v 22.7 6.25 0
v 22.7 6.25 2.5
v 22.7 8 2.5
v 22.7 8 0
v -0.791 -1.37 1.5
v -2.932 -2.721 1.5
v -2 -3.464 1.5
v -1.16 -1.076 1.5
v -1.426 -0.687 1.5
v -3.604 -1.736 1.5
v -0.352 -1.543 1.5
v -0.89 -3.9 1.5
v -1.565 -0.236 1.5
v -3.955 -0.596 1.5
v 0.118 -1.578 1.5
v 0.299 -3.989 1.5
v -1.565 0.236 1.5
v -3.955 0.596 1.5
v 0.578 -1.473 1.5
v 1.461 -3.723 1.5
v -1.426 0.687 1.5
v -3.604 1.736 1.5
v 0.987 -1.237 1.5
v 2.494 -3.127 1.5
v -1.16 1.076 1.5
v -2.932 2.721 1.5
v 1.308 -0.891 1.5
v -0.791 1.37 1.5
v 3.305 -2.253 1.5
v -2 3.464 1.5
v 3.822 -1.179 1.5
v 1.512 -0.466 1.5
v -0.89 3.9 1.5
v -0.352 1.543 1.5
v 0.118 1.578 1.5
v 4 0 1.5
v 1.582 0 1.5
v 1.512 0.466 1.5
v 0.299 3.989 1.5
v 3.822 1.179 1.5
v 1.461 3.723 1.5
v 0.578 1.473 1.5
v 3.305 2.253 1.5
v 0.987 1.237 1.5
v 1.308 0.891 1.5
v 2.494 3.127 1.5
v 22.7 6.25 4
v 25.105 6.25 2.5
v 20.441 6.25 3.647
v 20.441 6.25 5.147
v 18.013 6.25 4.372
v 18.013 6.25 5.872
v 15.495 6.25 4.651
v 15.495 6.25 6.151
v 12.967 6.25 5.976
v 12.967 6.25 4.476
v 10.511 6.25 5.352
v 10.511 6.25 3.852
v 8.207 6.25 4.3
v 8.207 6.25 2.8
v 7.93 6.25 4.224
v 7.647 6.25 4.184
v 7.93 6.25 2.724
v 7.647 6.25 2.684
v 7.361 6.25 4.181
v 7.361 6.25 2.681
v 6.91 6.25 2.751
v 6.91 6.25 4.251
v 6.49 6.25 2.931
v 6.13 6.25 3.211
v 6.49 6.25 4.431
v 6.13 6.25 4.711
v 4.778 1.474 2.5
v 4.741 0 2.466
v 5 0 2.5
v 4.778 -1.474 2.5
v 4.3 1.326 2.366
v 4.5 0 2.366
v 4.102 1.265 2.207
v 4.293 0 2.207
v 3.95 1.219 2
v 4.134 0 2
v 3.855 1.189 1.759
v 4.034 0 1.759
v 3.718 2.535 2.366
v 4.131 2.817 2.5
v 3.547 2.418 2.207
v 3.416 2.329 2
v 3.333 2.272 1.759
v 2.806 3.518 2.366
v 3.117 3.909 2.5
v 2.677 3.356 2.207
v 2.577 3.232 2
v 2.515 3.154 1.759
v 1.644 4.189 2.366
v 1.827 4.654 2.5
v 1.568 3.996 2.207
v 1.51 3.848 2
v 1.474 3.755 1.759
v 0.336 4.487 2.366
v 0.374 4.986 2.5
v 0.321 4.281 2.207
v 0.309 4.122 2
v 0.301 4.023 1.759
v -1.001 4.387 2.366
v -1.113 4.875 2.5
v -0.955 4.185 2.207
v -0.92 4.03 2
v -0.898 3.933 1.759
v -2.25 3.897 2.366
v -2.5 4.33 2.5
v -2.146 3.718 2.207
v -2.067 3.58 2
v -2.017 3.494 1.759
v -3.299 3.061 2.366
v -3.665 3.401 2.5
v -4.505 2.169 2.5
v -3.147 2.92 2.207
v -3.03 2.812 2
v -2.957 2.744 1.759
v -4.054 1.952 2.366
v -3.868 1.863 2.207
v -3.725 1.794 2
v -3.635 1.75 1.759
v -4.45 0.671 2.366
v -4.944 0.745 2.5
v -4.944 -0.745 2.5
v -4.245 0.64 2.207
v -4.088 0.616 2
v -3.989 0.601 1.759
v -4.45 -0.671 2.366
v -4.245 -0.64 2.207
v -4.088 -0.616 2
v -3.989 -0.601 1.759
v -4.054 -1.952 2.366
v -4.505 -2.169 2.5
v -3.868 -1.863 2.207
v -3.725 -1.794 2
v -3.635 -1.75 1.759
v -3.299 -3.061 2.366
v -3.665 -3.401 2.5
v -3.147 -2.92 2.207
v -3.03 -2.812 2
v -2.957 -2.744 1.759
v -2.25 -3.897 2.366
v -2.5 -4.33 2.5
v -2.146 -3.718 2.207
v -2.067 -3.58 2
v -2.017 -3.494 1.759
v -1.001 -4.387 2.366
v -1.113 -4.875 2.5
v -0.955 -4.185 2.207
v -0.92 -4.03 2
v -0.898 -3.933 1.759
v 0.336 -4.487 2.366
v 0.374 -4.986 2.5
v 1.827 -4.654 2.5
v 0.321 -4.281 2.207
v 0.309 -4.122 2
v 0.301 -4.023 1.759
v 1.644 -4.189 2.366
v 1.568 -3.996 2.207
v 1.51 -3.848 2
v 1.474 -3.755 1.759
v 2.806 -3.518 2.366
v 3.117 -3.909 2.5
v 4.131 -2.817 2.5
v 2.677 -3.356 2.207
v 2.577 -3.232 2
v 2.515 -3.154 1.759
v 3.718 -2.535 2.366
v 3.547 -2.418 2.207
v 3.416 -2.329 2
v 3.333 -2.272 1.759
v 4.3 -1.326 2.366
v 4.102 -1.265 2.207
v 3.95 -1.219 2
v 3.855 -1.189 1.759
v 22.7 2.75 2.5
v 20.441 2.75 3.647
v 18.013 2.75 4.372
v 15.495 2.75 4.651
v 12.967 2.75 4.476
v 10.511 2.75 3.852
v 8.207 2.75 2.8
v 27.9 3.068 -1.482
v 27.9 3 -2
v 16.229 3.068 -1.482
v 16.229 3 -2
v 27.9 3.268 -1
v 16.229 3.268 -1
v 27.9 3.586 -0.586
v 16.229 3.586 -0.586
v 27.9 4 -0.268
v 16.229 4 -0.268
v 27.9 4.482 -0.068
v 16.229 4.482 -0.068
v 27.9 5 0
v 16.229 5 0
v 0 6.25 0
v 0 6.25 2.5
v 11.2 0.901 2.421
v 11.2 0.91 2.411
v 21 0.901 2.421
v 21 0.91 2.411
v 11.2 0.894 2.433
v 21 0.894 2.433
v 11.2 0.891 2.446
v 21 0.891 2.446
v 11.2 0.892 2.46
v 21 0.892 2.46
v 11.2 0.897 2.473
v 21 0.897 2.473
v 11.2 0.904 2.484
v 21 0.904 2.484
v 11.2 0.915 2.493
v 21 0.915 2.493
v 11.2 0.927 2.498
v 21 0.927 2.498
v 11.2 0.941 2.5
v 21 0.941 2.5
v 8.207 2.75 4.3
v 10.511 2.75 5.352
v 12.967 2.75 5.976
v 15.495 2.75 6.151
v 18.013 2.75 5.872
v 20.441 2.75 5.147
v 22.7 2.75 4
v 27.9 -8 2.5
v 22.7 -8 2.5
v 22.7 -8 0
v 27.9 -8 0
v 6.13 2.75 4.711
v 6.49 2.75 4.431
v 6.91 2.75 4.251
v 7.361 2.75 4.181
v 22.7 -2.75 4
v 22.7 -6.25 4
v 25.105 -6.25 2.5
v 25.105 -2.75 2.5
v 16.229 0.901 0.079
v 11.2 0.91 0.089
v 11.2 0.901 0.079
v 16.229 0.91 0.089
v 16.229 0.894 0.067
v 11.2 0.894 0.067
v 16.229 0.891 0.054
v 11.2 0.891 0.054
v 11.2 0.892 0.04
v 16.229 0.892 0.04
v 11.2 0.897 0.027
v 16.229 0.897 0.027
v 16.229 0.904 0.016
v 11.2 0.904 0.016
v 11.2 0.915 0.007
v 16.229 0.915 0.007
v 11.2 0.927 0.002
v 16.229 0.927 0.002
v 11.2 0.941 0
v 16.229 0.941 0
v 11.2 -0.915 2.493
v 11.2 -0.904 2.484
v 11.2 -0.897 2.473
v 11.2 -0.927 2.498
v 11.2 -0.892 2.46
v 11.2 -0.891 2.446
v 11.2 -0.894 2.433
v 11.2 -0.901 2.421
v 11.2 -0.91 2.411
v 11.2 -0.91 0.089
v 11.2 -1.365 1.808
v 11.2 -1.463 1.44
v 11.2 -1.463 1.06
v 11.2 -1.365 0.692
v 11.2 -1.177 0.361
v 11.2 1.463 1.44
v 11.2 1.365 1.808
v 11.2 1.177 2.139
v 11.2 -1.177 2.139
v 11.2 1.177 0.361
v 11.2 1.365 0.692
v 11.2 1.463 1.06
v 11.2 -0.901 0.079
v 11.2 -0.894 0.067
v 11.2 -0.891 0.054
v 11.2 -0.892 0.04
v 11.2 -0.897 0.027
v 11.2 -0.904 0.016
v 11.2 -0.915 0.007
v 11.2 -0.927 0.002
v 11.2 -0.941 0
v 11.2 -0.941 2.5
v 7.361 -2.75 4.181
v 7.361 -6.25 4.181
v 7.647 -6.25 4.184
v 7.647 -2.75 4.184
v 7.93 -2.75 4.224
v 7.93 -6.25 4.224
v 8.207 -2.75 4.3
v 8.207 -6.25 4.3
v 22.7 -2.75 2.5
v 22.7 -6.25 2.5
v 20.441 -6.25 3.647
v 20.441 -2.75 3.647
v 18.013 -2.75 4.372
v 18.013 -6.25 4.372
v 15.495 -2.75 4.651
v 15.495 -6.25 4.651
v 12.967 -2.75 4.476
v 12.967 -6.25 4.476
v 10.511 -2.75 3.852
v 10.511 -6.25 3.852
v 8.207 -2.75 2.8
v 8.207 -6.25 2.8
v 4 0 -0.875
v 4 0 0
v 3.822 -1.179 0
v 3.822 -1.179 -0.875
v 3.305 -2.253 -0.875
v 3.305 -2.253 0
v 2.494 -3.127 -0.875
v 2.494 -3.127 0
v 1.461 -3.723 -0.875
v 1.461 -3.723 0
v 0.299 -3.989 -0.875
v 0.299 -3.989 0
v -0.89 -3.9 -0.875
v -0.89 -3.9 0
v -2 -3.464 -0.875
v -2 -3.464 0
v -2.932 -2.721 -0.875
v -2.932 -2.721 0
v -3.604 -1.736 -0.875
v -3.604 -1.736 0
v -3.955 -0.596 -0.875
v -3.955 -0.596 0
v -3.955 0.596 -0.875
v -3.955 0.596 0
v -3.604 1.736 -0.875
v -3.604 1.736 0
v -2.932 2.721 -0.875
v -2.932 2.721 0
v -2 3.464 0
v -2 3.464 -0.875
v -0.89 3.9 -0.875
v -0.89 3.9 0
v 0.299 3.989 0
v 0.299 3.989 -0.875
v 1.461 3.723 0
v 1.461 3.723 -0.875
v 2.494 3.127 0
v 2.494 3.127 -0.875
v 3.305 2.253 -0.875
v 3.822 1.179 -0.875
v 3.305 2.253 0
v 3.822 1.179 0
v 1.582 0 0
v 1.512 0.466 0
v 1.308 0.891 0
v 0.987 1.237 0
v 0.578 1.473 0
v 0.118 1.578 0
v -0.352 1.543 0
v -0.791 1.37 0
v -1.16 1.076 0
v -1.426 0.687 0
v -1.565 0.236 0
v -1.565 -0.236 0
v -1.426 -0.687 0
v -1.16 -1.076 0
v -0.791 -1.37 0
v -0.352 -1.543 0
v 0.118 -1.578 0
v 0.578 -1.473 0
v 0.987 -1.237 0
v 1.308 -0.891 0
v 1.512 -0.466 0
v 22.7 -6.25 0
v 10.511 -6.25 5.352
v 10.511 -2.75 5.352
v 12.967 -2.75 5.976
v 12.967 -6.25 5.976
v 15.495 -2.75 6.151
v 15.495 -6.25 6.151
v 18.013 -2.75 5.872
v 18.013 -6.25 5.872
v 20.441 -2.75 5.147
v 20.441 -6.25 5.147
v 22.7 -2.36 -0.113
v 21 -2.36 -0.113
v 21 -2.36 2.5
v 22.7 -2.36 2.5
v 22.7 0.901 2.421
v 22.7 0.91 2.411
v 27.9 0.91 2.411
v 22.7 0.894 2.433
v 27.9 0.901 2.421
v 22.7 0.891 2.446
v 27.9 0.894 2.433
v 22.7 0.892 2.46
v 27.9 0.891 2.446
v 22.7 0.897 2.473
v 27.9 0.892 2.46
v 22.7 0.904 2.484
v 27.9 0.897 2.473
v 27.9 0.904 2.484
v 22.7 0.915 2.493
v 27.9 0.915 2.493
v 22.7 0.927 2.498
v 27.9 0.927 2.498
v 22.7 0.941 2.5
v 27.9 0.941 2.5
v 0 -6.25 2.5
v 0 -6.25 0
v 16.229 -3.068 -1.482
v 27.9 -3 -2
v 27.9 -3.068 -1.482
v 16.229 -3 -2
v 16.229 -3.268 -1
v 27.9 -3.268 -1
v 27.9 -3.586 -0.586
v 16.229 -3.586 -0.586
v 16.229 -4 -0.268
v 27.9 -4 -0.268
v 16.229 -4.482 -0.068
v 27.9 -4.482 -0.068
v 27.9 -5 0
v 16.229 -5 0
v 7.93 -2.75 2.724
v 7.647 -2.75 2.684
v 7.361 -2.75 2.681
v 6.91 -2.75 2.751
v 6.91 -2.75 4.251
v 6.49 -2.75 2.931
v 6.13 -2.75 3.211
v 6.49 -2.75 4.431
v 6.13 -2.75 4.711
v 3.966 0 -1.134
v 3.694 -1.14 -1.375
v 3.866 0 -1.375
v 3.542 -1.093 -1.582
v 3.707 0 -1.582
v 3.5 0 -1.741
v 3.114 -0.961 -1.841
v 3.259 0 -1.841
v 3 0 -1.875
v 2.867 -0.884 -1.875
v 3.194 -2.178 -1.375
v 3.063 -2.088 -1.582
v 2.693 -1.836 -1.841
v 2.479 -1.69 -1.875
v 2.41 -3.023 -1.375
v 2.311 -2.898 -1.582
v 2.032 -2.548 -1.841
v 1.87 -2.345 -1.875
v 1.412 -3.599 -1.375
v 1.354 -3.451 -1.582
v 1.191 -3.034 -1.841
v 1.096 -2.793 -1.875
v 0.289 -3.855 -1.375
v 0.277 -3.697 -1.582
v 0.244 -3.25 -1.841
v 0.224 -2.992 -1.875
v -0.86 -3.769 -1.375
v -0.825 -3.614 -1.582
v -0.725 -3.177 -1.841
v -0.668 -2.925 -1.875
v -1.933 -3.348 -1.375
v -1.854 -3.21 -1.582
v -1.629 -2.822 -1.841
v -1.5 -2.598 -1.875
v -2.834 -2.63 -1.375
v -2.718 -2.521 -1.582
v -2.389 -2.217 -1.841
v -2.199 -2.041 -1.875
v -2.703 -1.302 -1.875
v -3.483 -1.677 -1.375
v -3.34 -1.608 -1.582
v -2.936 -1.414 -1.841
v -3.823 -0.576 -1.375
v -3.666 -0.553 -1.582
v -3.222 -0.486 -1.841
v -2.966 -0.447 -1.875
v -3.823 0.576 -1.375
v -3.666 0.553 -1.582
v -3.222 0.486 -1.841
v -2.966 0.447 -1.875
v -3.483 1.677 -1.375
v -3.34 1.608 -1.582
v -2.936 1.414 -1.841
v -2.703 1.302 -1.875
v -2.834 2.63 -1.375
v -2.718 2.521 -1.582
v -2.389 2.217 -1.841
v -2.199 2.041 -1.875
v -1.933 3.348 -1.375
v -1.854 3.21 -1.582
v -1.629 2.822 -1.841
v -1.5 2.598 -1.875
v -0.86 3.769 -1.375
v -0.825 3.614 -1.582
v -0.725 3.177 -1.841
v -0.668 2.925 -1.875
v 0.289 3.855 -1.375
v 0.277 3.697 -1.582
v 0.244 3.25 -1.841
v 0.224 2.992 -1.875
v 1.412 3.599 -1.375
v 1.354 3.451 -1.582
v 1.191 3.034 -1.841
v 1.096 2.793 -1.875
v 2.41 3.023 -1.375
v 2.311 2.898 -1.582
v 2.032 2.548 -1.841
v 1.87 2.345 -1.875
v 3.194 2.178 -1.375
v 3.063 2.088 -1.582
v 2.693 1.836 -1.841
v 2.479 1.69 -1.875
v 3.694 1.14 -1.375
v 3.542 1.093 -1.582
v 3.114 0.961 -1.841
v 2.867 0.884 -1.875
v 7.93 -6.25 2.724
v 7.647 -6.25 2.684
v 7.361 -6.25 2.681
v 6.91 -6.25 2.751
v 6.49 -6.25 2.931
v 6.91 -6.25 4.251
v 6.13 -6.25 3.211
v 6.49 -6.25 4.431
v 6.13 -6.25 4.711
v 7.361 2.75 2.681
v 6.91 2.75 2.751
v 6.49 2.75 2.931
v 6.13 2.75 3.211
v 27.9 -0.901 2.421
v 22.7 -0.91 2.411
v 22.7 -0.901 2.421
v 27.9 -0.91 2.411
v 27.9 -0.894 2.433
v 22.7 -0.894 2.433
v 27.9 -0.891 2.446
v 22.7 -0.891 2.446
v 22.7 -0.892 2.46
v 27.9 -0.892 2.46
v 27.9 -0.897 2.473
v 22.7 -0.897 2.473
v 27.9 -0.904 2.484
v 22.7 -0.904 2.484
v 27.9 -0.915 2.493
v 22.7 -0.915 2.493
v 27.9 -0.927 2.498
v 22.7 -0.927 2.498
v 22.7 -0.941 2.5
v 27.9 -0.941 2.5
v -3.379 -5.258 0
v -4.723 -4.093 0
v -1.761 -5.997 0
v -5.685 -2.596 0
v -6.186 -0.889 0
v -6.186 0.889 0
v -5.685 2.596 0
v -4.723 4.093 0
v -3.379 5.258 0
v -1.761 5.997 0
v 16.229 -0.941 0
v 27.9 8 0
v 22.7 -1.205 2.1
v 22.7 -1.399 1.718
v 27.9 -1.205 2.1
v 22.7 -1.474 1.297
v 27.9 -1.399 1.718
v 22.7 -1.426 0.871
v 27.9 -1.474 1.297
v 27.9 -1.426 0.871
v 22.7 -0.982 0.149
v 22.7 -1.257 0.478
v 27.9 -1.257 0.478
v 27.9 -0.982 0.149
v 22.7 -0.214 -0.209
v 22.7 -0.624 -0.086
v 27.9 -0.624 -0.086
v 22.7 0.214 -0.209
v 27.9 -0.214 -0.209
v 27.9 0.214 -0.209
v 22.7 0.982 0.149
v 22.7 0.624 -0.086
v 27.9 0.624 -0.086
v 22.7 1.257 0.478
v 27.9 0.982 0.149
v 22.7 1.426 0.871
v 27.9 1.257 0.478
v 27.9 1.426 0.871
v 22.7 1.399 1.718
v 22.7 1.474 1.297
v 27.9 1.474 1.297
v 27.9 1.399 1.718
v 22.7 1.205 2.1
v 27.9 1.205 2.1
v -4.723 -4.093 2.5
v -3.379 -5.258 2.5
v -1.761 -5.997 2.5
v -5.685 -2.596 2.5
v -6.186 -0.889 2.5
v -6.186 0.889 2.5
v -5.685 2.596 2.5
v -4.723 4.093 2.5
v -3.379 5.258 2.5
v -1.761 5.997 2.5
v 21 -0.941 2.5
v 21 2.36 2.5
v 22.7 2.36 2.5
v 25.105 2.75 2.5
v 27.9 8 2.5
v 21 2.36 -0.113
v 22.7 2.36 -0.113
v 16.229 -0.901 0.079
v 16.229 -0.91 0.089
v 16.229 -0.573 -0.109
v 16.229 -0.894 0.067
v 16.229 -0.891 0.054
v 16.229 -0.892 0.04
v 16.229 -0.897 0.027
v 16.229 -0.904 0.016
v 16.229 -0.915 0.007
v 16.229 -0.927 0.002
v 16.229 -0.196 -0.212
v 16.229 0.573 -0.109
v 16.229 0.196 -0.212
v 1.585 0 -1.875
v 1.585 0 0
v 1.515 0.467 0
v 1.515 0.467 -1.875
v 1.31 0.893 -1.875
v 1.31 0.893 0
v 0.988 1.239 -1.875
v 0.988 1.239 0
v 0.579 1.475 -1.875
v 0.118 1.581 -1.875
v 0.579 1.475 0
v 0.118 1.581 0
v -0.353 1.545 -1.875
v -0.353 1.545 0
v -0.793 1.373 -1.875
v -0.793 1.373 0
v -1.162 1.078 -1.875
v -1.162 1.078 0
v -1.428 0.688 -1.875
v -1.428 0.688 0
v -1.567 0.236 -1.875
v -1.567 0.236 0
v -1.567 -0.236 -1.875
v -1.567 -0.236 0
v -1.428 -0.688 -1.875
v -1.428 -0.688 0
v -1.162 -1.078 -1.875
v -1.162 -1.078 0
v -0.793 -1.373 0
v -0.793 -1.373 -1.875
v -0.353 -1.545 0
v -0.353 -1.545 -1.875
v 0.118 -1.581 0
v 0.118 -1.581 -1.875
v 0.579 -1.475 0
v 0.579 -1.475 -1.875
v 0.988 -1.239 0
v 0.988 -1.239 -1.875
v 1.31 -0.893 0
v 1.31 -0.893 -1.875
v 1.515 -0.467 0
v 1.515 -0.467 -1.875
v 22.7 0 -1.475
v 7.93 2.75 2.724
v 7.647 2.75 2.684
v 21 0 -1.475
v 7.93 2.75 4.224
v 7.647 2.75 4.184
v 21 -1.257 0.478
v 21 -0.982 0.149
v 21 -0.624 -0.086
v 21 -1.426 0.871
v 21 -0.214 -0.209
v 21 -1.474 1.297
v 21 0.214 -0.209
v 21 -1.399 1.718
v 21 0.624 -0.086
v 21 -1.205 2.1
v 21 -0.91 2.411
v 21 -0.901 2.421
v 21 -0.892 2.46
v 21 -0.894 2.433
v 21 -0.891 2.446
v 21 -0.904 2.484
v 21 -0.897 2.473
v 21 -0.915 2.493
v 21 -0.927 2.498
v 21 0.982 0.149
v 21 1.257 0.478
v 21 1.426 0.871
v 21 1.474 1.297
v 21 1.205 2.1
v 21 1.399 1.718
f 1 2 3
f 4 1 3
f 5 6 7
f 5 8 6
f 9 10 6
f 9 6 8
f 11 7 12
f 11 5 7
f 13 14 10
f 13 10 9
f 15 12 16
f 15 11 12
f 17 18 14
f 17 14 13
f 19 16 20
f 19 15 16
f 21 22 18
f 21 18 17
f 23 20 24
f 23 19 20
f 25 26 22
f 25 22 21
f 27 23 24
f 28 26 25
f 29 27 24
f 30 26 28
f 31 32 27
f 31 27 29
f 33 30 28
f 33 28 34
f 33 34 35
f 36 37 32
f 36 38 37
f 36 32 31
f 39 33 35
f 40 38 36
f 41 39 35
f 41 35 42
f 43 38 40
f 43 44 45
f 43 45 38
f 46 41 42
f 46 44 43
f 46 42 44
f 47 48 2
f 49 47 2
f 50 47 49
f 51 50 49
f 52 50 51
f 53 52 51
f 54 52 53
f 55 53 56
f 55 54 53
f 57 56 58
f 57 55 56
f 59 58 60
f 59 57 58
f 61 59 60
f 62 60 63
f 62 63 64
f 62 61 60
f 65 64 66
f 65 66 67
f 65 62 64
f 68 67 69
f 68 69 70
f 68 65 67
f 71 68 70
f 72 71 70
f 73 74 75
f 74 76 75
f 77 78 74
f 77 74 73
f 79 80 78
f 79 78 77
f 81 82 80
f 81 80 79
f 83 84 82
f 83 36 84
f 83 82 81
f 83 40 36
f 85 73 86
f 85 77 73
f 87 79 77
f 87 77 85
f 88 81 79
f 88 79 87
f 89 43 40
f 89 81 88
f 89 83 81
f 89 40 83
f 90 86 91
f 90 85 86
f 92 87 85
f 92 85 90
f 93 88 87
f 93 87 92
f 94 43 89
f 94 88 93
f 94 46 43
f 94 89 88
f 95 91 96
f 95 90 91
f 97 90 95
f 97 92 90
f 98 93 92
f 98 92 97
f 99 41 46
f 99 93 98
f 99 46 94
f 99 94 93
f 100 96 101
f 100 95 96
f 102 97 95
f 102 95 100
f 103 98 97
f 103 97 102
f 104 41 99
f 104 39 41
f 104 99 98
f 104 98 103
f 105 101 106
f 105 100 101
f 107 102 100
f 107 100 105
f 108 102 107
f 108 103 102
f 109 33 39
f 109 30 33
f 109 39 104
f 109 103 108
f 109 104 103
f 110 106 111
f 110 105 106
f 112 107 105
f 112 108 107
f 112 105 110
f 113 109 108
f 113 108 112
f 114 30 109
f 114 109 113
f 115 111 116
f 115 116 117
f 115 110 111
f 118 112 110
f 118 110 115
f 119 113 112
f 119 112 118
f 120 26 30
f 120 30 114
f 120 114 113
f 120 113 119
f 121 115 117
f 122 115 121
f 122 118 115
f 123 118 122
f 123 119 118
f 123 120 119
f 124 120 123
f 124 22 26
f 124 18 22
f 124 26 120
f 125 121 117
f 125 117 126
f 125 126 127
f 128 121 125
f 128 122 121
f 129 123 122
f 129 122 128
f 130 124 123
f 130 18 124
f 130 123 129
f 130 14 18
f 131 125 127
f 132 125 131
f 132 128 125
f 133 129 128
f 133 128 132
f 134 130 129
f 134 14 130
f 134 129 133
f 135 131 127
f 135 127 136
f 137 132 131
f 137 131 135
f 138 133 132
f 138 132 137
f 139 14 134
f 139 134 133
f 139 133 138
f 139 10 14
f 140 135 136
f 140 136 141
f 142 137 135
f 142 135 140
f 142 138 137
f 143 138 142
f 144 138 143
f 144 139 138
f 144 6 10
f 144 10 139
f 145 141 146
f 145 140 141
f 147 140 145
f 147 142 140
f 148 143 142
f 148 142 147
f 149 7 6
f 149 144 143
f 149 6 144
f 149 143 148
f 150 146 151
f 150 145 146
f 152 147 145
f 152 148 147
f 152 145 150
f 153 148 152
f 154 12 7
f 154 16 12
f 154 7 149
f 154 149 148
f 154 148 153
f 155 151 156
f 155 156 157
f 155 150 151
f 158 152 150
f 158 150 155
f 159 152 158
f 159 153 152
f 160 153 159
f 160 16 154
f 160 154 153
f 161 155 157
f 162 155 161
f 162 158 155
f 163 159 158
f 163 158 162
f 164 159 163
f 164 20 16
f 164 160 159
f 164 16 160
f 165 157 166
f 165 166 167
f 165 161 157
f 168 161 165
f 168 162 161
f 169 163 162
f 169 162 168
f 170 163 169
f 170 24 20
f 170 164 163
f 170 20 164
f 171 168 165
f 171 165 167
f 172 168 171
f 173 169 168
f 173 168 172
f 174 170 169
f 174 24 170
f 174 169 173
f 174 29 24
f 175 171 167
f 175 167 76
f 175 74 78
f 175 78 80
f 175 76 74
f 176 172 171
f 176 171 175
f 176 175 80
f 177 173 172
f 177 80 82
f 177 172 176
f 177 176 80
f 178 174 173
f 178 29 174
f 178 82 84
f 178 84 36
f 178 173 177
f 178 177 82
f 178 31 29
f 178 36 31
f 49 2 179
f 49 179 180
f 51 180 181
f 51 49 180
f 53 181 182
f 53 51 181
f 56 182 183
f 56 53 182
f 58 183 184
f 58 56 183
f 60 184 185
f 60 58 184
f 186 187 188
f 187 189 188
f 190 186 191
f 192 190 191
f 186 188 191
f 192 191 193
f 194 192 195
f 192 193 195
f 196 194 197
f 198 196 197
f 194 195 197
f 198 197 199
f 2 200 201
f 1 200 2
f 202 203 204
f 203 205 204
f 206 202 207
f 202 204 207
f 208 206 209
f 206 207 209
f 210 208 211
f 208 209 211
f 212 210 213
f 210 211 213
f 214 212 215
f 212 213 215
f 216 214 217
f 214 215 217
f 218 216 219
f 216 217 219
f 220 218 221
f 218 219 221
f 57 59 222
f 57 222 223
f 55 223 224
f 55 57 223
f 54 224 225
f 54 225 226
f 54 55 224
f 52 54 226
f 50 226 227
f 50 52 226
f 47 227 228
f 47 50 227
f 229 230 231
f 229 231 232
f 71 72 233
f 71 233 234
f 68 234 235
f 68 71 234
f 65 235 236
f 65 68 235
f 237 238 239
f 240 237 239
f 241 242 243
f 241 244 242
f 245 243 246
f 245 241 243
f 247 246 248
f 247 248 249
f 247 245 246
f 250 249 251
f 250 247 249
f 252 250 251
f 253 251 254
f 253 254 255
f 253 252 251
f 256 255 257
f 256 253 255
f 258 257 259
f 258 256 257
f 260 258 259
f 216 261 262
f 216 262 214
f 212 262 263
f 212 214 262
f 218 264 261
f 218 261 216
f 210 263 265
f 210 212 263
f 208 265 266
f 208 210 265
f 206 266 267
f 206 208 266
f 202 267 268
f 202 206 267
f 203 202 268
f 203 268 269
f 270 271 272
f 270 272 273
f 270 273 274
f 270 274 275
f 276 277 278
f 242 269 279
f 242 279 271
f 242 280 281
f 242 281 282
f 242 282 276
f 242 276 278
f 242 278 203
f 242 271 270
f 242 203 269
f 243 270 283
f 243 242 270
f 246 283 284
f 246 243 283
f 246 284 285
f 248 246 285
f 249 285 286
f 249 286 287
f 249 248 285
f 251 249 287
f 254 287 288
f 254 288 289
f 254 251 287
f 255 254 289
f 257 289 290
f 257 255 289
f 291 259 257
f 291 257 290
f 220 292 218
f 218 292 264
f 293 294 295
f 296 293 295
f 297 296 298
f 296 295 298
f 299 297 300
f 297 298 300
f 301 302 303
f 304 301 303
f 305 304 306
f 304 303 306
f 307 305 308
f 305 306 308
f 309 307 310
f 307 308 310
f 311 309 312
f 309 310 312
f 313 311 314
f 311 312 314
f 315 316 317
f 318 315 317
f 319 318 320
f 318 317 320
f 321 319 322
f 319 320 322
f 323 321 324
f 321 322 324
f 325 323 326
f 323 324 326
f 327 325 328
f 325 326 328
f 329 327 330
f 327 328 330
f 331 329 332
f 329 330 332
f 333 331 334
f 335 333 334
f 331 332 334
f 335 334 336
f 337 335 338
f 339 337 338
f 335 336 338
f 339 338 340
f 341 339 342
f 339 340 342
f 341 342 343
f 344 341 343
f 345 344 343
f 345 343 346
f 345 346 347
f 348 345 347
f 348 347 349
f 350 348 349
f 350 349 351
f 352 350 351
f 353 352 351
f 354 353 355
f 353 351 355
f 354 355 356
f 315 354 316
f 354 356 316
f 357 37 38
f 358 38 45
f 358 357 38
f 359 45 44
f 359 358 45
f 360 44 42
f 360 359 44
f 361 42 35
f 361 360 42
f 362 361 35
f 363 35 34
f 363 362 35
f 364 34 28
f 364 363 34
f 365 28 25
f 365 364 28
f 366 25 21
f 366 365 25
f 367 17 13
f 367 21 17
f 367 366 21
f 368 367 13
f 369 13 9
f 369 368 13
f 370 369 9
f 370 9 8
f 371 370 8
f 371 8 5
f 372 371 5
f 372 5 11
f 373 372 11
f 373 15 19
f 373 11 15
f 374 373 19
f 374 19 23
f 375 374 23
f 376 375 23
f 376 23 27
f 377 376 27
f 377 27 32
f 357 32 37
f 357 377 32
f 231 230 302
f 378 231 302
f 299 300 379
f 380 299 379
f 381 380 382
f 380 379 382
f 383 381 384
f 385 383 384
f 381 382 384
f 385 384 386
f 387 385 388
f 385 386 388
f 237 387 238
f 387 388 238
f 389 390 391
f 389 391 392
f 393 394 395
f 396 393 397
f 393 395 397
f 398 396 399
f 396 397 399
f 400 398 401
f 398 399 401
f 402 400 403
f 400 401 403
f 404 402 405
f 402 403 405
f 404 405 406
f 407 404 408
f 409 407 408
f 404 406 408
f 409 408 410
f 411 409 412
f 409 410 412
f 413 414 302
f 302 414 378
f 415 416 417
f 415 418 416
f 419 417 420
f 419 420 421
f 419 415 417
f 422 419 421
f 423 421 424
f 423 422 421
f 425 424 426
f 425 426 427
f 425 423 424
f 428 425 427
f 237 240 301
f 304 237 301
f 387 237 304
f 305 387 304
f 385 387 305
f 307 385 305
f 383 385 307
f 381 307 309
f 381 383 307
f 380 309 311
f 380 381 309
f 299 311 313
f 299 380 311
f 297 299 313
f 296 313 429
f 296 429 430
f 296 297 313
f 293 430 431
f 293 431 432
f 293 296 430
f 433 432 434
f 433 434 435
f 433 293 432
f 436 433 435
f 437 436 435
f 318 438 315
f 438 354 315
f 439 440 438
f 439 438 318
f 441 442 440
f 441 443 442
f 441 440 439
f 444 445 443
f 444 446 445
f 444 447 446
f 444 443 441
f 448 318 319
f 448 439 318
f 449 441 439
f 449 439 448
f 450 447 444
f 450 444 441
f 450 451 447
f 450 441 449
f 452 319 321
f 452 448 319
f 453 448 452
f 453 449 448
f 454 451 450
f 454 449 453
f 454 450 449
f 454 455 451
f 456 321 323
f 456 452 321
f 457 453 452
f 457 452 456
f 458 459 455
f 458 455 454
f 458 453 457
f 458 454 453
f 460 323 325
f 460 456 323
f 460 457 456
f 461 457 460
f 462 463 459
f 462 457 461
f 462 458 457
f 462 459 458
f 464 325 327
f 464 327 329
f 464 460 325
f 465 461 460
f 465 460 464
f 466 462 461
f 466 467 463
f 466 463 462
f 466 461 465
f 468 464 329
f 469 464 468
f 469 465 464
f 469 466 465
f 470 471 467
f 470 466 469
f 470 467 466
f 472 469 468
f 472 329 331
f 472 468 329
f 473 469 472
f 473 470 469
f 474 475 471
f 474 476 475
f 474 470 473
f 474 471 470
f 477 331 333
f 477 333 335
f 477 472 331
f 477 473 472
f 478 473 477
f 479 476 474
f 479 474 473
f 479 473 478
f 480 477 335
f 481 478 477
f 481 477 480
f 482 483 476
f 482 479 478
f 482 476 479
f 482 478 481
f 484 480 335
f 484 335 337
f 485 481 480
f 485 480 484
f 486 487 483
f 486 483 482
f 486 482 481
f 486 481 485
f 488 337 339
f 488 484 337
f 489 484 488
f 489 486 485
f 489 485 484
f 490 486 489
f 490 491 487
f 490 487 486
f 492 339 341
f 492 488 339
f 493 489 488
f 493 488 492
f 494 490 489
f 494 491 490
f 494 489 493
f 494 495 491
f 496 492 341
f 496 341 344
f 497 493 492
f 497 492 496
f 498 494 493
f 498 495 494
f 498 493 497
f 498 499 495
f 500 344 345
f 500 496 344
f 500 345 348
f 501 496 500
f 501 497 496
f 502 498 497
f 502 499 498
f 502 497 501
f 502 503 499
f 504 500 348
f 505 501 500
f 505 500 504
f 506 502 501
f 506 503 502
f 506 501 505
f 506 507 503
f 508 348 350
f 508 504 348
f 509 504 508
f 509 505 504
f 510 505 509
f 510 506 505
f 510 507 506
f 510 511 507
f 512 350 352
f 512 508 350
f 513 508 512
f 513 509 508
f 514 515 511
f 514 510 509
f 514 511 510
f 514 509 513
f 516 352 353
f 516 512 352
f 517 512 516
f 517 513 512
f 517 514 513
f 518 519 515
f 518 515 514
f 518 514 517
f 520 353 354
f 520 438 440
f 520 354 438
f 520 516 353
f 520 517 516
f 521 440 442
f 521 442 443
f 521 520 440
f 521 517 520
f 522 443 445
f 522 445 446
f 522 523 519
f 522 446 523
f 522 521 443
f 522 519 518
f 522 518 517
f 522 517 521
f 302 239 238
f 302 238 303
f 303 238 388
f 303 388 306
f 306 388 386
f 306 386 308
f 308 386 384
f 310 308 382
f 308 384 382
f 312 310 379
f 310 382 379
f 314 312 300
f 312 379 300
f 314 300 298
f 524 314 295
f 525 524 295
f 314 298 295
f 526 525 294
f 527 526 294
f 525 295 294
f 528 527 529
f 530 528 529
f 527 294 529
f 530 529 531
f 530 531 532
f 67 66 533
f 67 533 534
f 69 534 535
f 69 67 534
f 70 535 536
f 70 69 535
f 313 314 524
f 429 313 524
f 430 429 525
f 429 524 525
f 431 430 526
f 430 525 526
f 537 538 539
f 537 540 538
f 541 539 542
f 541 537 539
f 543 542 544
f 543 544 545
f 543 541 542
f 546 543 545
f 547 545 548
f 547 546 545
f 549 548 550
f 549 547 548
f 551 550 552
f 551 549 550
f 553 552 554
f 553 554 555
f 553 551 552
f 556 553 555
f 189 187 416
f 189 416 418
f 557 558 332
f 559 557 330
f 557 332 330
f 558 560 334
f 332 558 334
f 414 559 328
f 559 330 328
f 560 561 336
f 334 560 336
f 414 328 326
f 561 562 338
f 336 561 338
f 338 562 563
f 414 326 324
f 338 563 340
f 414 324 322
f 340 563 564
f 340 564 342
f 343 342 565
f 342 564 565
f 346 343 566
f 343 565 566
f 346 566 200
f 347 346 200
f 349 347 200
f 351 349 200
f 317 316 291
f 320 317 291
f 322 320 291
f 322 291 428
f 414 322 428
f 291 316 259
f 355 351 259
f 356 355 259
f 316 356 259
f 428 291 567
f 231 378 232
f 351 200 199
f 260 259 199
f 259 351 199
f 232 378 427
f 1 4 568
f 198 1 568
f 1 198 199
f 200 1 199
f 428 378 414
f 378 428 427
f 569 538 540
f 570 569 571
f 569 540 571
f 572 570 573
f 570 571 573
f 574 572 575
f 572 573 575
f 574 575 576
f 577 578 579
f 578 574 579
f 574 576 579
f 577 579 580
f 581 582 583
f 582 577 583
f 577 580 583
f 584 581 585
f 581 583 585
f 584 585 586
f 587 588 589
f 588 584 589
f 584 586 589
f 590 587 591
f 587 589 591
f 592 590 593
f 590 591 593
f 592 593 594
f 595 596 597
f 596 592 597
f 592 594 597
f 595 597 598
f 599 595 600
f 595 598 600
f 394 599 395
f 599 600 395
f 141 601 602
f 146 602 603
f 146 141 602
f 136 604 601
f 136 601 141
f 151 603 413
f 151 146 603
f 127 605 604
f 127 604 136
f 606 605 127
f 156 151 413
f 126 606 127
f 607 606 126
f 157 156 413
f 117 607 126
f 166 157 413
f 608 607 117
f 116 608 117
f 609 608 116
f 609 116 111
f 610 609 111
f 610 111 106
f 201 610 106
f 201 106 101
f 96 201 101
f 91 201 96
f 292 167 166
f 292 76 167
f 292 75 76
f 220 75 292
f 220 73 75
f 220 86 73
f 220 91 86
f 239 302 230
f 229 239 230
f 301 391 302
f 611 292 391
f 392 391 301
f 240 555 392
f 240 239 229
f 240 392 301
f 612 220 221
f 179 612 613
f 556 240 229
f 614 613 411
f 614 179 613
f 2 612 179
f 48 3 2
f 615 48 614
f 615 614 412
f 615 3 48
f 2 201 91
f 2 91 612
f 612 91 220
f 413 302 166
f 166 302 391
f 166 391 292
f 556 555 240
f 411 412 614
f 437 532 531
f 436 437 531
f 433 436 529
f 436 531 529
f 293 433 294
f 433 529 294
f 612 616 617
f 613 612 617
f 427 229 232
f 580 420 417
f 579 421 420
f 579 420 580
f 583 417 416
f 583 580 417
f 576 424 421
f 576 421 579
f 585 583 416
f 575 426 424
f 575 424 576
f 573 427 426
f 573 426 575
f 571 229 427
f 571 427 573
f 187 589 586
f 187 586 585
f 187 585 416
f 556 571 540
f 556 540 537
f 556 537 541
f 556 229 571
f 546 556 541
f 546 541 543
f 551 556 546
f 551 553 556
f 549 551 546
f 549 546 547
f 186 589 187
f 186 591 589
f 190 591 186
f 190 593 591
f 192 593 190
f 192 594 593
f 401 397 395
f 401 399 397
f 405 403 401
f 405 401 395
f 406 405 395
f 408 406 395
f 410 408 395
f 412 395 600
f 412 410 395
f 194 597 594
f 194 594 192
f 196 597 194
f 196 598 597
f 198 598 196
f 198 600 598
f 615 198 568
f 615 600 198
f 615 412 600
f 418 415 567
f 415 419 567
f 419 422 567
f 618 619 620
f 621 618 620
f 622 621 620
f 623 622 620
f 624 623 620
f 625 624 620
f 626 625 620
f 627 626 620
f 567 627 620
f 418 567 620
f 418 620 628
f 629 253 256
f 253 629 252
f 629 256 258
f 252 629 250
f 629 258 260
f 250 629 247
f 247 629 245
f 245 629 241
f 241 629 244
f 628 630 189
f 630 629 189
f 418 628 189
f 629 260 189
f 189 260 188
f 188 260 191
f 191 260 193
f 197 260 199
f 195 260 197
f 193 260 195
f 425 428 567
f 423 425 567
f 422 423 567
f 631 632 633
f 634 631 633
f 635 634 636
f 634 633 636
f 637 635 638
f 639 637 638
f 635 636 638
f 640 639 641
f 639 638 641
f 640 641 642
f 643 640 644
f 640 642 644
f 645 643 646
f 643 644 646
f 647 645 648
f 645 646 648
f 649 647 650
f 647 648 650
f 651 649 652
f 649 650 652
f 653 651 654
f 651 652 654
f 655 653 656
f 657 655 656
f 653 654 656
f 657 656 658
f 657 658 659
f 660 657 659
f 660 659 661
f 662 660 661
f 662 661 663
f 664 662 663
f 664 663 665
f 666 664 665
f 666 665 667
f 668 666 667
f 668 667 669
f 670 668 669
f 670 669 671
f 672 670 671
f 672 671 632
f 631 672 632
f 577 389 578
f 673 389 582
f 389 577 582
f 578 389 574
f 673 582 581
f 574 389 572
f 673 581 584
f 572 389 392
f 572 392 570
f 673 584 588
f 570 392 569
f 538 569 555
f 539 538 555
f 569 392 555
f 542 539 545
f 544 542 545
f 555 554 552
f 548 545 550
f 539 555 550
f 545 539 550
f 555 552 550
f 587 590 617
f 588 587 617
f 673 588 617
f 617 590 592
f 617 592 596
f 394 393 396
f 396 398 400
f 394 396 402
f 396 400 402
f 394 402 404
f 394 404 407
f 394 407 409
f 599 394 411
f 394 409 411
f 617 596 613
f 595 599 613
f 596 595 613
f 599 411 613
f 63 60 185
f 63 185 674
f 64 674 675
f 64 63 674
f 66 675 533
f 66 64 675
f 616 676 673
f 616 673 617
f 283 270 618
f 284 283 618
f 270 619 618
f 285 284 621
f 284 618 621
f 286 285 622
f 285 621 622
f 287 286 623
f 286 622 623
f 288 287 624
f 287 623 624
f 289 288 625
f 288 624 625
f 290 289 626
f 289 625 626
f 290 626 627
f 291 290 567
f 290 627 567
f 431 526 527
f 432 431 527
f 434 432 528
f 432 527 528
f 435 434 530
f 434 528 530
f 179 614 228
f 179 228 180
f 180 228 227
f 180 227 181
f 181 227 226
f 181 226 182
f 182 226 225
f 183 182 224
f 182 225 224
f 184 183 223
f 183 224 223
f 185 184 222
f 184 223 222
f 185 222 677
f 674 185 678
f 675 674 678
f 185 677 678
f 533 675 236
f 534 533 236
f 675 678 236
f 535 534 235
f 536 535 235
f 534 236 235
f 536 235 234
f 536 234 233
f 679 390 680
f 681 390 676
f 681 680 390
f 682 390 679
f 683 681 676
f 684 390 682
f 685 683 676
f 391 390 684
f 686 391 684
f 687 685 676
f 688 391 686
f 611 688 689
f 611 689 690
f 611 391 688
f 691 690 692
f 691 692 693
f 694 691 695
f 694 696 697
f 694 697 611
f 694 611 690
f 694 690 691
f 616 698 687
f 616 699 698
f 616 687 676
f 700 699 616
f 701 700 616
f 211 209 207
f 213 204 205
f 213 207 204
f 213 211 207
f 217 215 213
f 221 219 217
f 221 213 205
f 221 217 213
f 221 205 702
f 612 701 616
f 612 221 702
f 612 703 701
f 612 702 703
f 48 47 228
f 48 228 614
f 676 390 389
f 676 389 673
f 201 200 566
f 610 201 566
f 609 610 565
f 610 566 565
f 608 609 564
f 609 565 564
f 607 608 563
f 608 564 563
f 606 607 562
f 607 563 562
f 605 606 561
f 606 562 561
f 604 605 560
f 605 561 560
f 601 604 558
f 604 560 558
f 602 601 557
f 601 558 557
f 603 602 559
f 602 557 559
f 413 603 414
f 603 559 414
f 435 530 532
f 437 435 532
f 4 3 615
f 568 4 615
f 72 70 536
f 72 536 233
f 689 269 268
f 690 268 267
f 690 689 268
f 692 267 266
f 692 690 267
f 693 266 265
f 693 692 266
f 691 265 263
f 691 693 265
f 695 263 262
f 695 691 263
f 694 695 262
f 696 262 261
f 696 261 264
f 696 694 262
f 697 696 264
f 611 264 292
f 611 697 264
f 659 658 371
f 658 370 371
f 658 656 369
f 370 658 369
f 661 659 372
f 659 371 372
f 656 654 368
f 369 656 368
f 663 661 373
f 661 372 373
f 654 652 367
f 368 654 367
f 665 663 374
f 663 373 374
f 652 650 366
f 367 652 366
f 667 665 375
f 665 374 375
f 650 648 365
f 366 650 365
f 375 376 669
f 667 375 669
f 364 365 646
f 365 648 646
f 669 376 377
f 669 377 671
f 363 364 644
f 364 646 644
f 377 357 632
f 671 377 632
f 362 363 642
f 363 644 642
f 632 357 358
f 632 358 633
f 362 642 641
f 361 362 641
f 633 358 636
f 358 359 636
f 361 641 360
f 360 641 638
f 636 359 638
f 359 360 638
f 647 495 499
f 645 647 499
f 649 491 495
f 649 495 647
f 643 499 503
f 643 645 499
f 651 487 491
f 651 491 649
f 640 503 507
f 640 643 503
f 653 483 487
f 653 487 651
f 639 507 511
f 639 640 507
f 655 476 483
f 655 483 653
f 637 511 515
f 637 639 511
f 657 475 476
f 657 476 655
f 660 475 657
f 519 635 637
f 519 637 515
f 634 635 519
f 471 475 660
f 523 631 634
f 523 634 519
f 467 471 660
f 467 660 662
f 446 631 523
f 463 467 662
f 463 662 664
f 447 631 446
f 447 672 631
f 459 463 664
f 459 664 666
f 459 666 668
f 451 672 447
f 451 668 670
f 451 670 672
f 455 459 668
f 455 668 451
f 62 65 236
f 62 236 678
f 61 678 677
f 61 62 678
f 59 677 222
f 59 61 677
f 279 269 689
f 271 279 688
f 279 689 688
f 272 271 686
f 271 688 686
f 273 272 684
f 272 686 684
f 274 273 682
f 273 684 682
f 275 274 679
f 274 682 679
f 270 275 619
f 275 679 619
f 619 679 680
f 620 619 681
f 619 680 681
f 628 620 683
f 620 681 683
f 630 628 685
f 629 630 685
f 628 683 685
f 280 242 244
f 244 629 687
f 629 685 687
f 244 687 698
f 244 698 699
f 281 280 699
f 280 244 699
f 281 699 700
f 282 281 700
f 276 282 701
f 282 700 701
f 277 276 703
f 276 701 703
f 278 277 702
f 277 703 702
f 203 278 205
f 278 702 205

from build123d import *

# Parameters (mm, degrees)
SKETCH1_R           = 1.5825
SKETCH1_W           = 10
SKETCH1_H           = 12.5
BOSS_EXTRUDE1_DEPTH = 2.5
SKETCH2_W           = 5.2
SKETCH2_H           = 16
BOSS_EXTRUDE2_DEPTH = 2.5
SKETCH3_W           = 1.7
SKETCH3_H           = 4.72
CUT_EXTRUDE1_DEPTH  = 30.1317696
BOSS_EXTRUDE3_DEPTH = 3.5
BOSS_EXTRUDE5_DEPTH = 3.5
SKETCH10_R          = 4
BOSS_EXTRUDE6_DEPTH = 1.875
SKETCH11_R          = 1.585
CUT_EXTRUDE4_DEPTH  = 30.669560778
SKETCH12_R          = 4
CUT_EXTRUDE5_DEPTH  = 1
FILLET1_R           = 1
FILLET2_R           = 1
SKETCH14_W          = 11.670795551
SKETCH14_H          = 6
BOSS_EXTRUDE7_DEPTH = 2
SKETCH6_R           = 1.475
CUT_EXTRUDE3_DEPTH  = 16.7
CUT_EXTRUDE8_DEPTH  = 1.7
FILLET3_R           = 2
FILLET4_R           = 0.05


with BuildPart() as part:
    # Sketch1 → Boss-Extrude1 (new body)
    # profile 1 of 2: a face of its own
    with BuildSketch(Plane.XY):
        with BuildLine():
            ThreePointArc((0, 6.25), (-6.25, 0), (0, -6.25))
            Line((0, -6.25), (12.7, -6.25))
            Line((12.7, -6.25), (12.7, 6.25))
            Line((12.7, 6.25), (0, 6.25))
        make_face()
        Circle(SKETCH1_R, mode=Mode.SUBTRACT)
    # profile 2 of 2: a face of its own
    with BuildSketch(Plane.XY):
        with Locations((17.7, 0)):
            Rectangle(SKETCH1_W, SKETCH1_H)
    extrude(amount=BOSS_EXTRUDE1_DEPTH)

    # Sketch2 → Boss-Extrude2 (add)
    with BuildSketch(Plane.XY.offset(2.5)):
        with Locations((25.3, 0)):
            Rectangle(SKETCH2_W, SKETCH2_H)
    extrude(amount=-BOSS_EXTRUDE2_DEPTH)

    # Sketch3 → Cut-Extrude1 (cut, through all)
    with BuildSketch(Plane.XY.offset(2.5)):
        with Locations((21.85, 0)):
            Rectangle(SKETCH3_W, SKETCH3_H)
    extrude(amount=-CUT_EXTRUDE1_DEPTH, mode=Mode.SUBTRACT)


with BuildPart() as body_2:
    # Sketch7 → Boss-Extrude3 (new body)
    with BuildSketch(Plane.XZ.offset(6.25)):
        with BuildLine():
            Line((6.129900512, 3.210673711), (6.129900512, 4.710673711))
            ThreePointArc((6.129900512, 4.710673711), (6.694341527, 4.327552018), (7.360579964, 4.180915603))
            ThreePointArc((7.360579964, 4.180915603), (7.789326283, 4.199870579), (8.206709695, 4.299739418))
            ThreePointArc((8.206709695, 4.299739418), (15.494742209, 6.151071465), (22.7, 4))
            Line((22.7, 4), (22.7, 2.5))
            ThreePointArc((22.7, 2.5), (15.494742209, 4.651071465), (8.206709695, 2.799739418))
            ThreePointArc((8.206709695, 2.799739418), (7.789326283, 2.699870579), (7.360579964, 2.680915603))
            ThreePointArc((7.360579964, 2.680915603), (6.694341527, 2.827552018), (6.129900512, 3.210673711))
        make_face()
    extrude(amount=-BOSS_EXTRUDE3_DEPTH)


with BuildPart() as body_3:
    # Sketch9 → Boss-Extrude5 (new body)
    with BuildSketch(Plane.XZ.offset(6.25)):
        Polygon((22.7, 4), (25.104907101, 2.5), (22.7, 2.5), align=None)
    extrude(amount=-BOSS_EXTRUDE5_DEPTH)

    # Combine1: union body 2
    add(body_2.part)


with BuildPart() as body_3_2:
    # Mirror5: mirrored copy
    add(body_3.part.mirror(Plane(origin=(0, 0, 0), x_dir=(0, 0, 1), z_dir=(0, -1, 0))))


with BuildPart() as part_1:
    add(part.part)

    # Combine4: union body 3, body 3 2
    add(body_3.part)
    add(body_3_2.part)

    # Sketch10 → Boss-Extrude6 (add)
    with BuildSketch(Plane(origin=(0, 0, 0), x_dir=(-1, 0, 0), z_dir=(0, 0, -1))):
        with Locations(Location((0, 0, 0), (0, 0, 180))):
            Circle(SKETCH10_R)
    extrude(amount=BOSS_EXTRUDE6_DEPTH)

    # Sketch11 → Cut-Extrude4 (cut, through all)
    with BuildSketch(Plane.XY):
        Circle(SKETCH11_R)
    extrude(amount=-CUT_EXTRUDE4_DEPTH, mode=Mode.SUBTRACT)

    # Sketch12 → Cut-Extrude5 (cut)
    with BuildSketch(Plane.XY.offset(2.5)):
        Circle(SKETCH12_R)
    extrude(amount=-CUT_EXTRUDE5_DEPTH, mode=Mode.SUBTRACT)

    # Fillet1
    fillet1_edges = [part_1.edges().sort_by_distance(p)[0] for p in [
        (-4, 0, 2.5),
    ]]
    fillet(fillet1_edges, radius=FILLET1_R - 0.0001)  # a hair under: the kernel refuses the full size

    # Fillet2
    fillet2_edges = [part_1.edges().sort_by_distance(p)[0] for p in [
        (-4, 0, -1.875),
    ]]
    fillet(fillet2_edges, radius=FILLET2_R)

    # Sketch14 → Boss-Extrude7 (add)
    with BuildSketch(Plane(origin=(0, 0, 0), x_dir=(-1, 0, 0), z_dir=(0, 0, -1))):
        with Locations((-22.064602224, 0)):
            Rectangle(SKETCH14_W, SKETCH14_H)
    extrude(amount=BOSS_EXTRUDE7_DEPTH)

    # Sketch6 → Cut-Extrude3 (cut)
    with BuildSketch(Plane(origin=(27.9, 0, 0), x_dir=(0, 0, -1), z_dir=(1, 0, 0))):
        with Locations((-1.25, 0)):
            Circle(SKETCH6_R)
    extrude(amount=-CUT_EXTRUDE3_DEPTH, mode=Mode.SUBTRACT)

    # Sketch16 → Cut-Extrude8 (cut)
    with BuildSketch(Plane(origin=(21, 0, 0), x_dir=(0, 0, -1), z_dir=(1, 0, 0))):
        Polygon((1.475093271, 0), (0.112546635, 2.36), (-2.612546635, 2.36), (-3.975093271, 0), (-2.612546635, -2.36), (0.112546635, -2.36), align=None)
    extrude(amount=CUT_EXTRUDE8_DEPTH, mode=Mode.SUBTRACT)

    # Fillet3
    fillet3_edges = [part_1.edges().sort_by_distance(p)[0] for p in [
        (22.064602225, -3, 0),
        (22.064602225, 3, 0),
    ]]
    fillet(fillet3_edges, radius=FILLET3_R - 0.0001)  # a hair under: the kernel refuses the full size

    # Fillet4
    fillet4_edges = [part_1.edges().sort_by_distance(p)[0] for p in [
        (16.1, -0.783022988, 2.5),
        (25.3, -0.783022988, 2.5),
        (25.3, 0.783022988, 2.5),
        (16.1, 0.783022988, 2.5),
        (13.714602225, -0.783022988, 0),
        (13.714602225, 0.783022988, 0),
    ]]
    fillet(fillet4_edges, radius=FILLET4_R)


solid = part_1.part
